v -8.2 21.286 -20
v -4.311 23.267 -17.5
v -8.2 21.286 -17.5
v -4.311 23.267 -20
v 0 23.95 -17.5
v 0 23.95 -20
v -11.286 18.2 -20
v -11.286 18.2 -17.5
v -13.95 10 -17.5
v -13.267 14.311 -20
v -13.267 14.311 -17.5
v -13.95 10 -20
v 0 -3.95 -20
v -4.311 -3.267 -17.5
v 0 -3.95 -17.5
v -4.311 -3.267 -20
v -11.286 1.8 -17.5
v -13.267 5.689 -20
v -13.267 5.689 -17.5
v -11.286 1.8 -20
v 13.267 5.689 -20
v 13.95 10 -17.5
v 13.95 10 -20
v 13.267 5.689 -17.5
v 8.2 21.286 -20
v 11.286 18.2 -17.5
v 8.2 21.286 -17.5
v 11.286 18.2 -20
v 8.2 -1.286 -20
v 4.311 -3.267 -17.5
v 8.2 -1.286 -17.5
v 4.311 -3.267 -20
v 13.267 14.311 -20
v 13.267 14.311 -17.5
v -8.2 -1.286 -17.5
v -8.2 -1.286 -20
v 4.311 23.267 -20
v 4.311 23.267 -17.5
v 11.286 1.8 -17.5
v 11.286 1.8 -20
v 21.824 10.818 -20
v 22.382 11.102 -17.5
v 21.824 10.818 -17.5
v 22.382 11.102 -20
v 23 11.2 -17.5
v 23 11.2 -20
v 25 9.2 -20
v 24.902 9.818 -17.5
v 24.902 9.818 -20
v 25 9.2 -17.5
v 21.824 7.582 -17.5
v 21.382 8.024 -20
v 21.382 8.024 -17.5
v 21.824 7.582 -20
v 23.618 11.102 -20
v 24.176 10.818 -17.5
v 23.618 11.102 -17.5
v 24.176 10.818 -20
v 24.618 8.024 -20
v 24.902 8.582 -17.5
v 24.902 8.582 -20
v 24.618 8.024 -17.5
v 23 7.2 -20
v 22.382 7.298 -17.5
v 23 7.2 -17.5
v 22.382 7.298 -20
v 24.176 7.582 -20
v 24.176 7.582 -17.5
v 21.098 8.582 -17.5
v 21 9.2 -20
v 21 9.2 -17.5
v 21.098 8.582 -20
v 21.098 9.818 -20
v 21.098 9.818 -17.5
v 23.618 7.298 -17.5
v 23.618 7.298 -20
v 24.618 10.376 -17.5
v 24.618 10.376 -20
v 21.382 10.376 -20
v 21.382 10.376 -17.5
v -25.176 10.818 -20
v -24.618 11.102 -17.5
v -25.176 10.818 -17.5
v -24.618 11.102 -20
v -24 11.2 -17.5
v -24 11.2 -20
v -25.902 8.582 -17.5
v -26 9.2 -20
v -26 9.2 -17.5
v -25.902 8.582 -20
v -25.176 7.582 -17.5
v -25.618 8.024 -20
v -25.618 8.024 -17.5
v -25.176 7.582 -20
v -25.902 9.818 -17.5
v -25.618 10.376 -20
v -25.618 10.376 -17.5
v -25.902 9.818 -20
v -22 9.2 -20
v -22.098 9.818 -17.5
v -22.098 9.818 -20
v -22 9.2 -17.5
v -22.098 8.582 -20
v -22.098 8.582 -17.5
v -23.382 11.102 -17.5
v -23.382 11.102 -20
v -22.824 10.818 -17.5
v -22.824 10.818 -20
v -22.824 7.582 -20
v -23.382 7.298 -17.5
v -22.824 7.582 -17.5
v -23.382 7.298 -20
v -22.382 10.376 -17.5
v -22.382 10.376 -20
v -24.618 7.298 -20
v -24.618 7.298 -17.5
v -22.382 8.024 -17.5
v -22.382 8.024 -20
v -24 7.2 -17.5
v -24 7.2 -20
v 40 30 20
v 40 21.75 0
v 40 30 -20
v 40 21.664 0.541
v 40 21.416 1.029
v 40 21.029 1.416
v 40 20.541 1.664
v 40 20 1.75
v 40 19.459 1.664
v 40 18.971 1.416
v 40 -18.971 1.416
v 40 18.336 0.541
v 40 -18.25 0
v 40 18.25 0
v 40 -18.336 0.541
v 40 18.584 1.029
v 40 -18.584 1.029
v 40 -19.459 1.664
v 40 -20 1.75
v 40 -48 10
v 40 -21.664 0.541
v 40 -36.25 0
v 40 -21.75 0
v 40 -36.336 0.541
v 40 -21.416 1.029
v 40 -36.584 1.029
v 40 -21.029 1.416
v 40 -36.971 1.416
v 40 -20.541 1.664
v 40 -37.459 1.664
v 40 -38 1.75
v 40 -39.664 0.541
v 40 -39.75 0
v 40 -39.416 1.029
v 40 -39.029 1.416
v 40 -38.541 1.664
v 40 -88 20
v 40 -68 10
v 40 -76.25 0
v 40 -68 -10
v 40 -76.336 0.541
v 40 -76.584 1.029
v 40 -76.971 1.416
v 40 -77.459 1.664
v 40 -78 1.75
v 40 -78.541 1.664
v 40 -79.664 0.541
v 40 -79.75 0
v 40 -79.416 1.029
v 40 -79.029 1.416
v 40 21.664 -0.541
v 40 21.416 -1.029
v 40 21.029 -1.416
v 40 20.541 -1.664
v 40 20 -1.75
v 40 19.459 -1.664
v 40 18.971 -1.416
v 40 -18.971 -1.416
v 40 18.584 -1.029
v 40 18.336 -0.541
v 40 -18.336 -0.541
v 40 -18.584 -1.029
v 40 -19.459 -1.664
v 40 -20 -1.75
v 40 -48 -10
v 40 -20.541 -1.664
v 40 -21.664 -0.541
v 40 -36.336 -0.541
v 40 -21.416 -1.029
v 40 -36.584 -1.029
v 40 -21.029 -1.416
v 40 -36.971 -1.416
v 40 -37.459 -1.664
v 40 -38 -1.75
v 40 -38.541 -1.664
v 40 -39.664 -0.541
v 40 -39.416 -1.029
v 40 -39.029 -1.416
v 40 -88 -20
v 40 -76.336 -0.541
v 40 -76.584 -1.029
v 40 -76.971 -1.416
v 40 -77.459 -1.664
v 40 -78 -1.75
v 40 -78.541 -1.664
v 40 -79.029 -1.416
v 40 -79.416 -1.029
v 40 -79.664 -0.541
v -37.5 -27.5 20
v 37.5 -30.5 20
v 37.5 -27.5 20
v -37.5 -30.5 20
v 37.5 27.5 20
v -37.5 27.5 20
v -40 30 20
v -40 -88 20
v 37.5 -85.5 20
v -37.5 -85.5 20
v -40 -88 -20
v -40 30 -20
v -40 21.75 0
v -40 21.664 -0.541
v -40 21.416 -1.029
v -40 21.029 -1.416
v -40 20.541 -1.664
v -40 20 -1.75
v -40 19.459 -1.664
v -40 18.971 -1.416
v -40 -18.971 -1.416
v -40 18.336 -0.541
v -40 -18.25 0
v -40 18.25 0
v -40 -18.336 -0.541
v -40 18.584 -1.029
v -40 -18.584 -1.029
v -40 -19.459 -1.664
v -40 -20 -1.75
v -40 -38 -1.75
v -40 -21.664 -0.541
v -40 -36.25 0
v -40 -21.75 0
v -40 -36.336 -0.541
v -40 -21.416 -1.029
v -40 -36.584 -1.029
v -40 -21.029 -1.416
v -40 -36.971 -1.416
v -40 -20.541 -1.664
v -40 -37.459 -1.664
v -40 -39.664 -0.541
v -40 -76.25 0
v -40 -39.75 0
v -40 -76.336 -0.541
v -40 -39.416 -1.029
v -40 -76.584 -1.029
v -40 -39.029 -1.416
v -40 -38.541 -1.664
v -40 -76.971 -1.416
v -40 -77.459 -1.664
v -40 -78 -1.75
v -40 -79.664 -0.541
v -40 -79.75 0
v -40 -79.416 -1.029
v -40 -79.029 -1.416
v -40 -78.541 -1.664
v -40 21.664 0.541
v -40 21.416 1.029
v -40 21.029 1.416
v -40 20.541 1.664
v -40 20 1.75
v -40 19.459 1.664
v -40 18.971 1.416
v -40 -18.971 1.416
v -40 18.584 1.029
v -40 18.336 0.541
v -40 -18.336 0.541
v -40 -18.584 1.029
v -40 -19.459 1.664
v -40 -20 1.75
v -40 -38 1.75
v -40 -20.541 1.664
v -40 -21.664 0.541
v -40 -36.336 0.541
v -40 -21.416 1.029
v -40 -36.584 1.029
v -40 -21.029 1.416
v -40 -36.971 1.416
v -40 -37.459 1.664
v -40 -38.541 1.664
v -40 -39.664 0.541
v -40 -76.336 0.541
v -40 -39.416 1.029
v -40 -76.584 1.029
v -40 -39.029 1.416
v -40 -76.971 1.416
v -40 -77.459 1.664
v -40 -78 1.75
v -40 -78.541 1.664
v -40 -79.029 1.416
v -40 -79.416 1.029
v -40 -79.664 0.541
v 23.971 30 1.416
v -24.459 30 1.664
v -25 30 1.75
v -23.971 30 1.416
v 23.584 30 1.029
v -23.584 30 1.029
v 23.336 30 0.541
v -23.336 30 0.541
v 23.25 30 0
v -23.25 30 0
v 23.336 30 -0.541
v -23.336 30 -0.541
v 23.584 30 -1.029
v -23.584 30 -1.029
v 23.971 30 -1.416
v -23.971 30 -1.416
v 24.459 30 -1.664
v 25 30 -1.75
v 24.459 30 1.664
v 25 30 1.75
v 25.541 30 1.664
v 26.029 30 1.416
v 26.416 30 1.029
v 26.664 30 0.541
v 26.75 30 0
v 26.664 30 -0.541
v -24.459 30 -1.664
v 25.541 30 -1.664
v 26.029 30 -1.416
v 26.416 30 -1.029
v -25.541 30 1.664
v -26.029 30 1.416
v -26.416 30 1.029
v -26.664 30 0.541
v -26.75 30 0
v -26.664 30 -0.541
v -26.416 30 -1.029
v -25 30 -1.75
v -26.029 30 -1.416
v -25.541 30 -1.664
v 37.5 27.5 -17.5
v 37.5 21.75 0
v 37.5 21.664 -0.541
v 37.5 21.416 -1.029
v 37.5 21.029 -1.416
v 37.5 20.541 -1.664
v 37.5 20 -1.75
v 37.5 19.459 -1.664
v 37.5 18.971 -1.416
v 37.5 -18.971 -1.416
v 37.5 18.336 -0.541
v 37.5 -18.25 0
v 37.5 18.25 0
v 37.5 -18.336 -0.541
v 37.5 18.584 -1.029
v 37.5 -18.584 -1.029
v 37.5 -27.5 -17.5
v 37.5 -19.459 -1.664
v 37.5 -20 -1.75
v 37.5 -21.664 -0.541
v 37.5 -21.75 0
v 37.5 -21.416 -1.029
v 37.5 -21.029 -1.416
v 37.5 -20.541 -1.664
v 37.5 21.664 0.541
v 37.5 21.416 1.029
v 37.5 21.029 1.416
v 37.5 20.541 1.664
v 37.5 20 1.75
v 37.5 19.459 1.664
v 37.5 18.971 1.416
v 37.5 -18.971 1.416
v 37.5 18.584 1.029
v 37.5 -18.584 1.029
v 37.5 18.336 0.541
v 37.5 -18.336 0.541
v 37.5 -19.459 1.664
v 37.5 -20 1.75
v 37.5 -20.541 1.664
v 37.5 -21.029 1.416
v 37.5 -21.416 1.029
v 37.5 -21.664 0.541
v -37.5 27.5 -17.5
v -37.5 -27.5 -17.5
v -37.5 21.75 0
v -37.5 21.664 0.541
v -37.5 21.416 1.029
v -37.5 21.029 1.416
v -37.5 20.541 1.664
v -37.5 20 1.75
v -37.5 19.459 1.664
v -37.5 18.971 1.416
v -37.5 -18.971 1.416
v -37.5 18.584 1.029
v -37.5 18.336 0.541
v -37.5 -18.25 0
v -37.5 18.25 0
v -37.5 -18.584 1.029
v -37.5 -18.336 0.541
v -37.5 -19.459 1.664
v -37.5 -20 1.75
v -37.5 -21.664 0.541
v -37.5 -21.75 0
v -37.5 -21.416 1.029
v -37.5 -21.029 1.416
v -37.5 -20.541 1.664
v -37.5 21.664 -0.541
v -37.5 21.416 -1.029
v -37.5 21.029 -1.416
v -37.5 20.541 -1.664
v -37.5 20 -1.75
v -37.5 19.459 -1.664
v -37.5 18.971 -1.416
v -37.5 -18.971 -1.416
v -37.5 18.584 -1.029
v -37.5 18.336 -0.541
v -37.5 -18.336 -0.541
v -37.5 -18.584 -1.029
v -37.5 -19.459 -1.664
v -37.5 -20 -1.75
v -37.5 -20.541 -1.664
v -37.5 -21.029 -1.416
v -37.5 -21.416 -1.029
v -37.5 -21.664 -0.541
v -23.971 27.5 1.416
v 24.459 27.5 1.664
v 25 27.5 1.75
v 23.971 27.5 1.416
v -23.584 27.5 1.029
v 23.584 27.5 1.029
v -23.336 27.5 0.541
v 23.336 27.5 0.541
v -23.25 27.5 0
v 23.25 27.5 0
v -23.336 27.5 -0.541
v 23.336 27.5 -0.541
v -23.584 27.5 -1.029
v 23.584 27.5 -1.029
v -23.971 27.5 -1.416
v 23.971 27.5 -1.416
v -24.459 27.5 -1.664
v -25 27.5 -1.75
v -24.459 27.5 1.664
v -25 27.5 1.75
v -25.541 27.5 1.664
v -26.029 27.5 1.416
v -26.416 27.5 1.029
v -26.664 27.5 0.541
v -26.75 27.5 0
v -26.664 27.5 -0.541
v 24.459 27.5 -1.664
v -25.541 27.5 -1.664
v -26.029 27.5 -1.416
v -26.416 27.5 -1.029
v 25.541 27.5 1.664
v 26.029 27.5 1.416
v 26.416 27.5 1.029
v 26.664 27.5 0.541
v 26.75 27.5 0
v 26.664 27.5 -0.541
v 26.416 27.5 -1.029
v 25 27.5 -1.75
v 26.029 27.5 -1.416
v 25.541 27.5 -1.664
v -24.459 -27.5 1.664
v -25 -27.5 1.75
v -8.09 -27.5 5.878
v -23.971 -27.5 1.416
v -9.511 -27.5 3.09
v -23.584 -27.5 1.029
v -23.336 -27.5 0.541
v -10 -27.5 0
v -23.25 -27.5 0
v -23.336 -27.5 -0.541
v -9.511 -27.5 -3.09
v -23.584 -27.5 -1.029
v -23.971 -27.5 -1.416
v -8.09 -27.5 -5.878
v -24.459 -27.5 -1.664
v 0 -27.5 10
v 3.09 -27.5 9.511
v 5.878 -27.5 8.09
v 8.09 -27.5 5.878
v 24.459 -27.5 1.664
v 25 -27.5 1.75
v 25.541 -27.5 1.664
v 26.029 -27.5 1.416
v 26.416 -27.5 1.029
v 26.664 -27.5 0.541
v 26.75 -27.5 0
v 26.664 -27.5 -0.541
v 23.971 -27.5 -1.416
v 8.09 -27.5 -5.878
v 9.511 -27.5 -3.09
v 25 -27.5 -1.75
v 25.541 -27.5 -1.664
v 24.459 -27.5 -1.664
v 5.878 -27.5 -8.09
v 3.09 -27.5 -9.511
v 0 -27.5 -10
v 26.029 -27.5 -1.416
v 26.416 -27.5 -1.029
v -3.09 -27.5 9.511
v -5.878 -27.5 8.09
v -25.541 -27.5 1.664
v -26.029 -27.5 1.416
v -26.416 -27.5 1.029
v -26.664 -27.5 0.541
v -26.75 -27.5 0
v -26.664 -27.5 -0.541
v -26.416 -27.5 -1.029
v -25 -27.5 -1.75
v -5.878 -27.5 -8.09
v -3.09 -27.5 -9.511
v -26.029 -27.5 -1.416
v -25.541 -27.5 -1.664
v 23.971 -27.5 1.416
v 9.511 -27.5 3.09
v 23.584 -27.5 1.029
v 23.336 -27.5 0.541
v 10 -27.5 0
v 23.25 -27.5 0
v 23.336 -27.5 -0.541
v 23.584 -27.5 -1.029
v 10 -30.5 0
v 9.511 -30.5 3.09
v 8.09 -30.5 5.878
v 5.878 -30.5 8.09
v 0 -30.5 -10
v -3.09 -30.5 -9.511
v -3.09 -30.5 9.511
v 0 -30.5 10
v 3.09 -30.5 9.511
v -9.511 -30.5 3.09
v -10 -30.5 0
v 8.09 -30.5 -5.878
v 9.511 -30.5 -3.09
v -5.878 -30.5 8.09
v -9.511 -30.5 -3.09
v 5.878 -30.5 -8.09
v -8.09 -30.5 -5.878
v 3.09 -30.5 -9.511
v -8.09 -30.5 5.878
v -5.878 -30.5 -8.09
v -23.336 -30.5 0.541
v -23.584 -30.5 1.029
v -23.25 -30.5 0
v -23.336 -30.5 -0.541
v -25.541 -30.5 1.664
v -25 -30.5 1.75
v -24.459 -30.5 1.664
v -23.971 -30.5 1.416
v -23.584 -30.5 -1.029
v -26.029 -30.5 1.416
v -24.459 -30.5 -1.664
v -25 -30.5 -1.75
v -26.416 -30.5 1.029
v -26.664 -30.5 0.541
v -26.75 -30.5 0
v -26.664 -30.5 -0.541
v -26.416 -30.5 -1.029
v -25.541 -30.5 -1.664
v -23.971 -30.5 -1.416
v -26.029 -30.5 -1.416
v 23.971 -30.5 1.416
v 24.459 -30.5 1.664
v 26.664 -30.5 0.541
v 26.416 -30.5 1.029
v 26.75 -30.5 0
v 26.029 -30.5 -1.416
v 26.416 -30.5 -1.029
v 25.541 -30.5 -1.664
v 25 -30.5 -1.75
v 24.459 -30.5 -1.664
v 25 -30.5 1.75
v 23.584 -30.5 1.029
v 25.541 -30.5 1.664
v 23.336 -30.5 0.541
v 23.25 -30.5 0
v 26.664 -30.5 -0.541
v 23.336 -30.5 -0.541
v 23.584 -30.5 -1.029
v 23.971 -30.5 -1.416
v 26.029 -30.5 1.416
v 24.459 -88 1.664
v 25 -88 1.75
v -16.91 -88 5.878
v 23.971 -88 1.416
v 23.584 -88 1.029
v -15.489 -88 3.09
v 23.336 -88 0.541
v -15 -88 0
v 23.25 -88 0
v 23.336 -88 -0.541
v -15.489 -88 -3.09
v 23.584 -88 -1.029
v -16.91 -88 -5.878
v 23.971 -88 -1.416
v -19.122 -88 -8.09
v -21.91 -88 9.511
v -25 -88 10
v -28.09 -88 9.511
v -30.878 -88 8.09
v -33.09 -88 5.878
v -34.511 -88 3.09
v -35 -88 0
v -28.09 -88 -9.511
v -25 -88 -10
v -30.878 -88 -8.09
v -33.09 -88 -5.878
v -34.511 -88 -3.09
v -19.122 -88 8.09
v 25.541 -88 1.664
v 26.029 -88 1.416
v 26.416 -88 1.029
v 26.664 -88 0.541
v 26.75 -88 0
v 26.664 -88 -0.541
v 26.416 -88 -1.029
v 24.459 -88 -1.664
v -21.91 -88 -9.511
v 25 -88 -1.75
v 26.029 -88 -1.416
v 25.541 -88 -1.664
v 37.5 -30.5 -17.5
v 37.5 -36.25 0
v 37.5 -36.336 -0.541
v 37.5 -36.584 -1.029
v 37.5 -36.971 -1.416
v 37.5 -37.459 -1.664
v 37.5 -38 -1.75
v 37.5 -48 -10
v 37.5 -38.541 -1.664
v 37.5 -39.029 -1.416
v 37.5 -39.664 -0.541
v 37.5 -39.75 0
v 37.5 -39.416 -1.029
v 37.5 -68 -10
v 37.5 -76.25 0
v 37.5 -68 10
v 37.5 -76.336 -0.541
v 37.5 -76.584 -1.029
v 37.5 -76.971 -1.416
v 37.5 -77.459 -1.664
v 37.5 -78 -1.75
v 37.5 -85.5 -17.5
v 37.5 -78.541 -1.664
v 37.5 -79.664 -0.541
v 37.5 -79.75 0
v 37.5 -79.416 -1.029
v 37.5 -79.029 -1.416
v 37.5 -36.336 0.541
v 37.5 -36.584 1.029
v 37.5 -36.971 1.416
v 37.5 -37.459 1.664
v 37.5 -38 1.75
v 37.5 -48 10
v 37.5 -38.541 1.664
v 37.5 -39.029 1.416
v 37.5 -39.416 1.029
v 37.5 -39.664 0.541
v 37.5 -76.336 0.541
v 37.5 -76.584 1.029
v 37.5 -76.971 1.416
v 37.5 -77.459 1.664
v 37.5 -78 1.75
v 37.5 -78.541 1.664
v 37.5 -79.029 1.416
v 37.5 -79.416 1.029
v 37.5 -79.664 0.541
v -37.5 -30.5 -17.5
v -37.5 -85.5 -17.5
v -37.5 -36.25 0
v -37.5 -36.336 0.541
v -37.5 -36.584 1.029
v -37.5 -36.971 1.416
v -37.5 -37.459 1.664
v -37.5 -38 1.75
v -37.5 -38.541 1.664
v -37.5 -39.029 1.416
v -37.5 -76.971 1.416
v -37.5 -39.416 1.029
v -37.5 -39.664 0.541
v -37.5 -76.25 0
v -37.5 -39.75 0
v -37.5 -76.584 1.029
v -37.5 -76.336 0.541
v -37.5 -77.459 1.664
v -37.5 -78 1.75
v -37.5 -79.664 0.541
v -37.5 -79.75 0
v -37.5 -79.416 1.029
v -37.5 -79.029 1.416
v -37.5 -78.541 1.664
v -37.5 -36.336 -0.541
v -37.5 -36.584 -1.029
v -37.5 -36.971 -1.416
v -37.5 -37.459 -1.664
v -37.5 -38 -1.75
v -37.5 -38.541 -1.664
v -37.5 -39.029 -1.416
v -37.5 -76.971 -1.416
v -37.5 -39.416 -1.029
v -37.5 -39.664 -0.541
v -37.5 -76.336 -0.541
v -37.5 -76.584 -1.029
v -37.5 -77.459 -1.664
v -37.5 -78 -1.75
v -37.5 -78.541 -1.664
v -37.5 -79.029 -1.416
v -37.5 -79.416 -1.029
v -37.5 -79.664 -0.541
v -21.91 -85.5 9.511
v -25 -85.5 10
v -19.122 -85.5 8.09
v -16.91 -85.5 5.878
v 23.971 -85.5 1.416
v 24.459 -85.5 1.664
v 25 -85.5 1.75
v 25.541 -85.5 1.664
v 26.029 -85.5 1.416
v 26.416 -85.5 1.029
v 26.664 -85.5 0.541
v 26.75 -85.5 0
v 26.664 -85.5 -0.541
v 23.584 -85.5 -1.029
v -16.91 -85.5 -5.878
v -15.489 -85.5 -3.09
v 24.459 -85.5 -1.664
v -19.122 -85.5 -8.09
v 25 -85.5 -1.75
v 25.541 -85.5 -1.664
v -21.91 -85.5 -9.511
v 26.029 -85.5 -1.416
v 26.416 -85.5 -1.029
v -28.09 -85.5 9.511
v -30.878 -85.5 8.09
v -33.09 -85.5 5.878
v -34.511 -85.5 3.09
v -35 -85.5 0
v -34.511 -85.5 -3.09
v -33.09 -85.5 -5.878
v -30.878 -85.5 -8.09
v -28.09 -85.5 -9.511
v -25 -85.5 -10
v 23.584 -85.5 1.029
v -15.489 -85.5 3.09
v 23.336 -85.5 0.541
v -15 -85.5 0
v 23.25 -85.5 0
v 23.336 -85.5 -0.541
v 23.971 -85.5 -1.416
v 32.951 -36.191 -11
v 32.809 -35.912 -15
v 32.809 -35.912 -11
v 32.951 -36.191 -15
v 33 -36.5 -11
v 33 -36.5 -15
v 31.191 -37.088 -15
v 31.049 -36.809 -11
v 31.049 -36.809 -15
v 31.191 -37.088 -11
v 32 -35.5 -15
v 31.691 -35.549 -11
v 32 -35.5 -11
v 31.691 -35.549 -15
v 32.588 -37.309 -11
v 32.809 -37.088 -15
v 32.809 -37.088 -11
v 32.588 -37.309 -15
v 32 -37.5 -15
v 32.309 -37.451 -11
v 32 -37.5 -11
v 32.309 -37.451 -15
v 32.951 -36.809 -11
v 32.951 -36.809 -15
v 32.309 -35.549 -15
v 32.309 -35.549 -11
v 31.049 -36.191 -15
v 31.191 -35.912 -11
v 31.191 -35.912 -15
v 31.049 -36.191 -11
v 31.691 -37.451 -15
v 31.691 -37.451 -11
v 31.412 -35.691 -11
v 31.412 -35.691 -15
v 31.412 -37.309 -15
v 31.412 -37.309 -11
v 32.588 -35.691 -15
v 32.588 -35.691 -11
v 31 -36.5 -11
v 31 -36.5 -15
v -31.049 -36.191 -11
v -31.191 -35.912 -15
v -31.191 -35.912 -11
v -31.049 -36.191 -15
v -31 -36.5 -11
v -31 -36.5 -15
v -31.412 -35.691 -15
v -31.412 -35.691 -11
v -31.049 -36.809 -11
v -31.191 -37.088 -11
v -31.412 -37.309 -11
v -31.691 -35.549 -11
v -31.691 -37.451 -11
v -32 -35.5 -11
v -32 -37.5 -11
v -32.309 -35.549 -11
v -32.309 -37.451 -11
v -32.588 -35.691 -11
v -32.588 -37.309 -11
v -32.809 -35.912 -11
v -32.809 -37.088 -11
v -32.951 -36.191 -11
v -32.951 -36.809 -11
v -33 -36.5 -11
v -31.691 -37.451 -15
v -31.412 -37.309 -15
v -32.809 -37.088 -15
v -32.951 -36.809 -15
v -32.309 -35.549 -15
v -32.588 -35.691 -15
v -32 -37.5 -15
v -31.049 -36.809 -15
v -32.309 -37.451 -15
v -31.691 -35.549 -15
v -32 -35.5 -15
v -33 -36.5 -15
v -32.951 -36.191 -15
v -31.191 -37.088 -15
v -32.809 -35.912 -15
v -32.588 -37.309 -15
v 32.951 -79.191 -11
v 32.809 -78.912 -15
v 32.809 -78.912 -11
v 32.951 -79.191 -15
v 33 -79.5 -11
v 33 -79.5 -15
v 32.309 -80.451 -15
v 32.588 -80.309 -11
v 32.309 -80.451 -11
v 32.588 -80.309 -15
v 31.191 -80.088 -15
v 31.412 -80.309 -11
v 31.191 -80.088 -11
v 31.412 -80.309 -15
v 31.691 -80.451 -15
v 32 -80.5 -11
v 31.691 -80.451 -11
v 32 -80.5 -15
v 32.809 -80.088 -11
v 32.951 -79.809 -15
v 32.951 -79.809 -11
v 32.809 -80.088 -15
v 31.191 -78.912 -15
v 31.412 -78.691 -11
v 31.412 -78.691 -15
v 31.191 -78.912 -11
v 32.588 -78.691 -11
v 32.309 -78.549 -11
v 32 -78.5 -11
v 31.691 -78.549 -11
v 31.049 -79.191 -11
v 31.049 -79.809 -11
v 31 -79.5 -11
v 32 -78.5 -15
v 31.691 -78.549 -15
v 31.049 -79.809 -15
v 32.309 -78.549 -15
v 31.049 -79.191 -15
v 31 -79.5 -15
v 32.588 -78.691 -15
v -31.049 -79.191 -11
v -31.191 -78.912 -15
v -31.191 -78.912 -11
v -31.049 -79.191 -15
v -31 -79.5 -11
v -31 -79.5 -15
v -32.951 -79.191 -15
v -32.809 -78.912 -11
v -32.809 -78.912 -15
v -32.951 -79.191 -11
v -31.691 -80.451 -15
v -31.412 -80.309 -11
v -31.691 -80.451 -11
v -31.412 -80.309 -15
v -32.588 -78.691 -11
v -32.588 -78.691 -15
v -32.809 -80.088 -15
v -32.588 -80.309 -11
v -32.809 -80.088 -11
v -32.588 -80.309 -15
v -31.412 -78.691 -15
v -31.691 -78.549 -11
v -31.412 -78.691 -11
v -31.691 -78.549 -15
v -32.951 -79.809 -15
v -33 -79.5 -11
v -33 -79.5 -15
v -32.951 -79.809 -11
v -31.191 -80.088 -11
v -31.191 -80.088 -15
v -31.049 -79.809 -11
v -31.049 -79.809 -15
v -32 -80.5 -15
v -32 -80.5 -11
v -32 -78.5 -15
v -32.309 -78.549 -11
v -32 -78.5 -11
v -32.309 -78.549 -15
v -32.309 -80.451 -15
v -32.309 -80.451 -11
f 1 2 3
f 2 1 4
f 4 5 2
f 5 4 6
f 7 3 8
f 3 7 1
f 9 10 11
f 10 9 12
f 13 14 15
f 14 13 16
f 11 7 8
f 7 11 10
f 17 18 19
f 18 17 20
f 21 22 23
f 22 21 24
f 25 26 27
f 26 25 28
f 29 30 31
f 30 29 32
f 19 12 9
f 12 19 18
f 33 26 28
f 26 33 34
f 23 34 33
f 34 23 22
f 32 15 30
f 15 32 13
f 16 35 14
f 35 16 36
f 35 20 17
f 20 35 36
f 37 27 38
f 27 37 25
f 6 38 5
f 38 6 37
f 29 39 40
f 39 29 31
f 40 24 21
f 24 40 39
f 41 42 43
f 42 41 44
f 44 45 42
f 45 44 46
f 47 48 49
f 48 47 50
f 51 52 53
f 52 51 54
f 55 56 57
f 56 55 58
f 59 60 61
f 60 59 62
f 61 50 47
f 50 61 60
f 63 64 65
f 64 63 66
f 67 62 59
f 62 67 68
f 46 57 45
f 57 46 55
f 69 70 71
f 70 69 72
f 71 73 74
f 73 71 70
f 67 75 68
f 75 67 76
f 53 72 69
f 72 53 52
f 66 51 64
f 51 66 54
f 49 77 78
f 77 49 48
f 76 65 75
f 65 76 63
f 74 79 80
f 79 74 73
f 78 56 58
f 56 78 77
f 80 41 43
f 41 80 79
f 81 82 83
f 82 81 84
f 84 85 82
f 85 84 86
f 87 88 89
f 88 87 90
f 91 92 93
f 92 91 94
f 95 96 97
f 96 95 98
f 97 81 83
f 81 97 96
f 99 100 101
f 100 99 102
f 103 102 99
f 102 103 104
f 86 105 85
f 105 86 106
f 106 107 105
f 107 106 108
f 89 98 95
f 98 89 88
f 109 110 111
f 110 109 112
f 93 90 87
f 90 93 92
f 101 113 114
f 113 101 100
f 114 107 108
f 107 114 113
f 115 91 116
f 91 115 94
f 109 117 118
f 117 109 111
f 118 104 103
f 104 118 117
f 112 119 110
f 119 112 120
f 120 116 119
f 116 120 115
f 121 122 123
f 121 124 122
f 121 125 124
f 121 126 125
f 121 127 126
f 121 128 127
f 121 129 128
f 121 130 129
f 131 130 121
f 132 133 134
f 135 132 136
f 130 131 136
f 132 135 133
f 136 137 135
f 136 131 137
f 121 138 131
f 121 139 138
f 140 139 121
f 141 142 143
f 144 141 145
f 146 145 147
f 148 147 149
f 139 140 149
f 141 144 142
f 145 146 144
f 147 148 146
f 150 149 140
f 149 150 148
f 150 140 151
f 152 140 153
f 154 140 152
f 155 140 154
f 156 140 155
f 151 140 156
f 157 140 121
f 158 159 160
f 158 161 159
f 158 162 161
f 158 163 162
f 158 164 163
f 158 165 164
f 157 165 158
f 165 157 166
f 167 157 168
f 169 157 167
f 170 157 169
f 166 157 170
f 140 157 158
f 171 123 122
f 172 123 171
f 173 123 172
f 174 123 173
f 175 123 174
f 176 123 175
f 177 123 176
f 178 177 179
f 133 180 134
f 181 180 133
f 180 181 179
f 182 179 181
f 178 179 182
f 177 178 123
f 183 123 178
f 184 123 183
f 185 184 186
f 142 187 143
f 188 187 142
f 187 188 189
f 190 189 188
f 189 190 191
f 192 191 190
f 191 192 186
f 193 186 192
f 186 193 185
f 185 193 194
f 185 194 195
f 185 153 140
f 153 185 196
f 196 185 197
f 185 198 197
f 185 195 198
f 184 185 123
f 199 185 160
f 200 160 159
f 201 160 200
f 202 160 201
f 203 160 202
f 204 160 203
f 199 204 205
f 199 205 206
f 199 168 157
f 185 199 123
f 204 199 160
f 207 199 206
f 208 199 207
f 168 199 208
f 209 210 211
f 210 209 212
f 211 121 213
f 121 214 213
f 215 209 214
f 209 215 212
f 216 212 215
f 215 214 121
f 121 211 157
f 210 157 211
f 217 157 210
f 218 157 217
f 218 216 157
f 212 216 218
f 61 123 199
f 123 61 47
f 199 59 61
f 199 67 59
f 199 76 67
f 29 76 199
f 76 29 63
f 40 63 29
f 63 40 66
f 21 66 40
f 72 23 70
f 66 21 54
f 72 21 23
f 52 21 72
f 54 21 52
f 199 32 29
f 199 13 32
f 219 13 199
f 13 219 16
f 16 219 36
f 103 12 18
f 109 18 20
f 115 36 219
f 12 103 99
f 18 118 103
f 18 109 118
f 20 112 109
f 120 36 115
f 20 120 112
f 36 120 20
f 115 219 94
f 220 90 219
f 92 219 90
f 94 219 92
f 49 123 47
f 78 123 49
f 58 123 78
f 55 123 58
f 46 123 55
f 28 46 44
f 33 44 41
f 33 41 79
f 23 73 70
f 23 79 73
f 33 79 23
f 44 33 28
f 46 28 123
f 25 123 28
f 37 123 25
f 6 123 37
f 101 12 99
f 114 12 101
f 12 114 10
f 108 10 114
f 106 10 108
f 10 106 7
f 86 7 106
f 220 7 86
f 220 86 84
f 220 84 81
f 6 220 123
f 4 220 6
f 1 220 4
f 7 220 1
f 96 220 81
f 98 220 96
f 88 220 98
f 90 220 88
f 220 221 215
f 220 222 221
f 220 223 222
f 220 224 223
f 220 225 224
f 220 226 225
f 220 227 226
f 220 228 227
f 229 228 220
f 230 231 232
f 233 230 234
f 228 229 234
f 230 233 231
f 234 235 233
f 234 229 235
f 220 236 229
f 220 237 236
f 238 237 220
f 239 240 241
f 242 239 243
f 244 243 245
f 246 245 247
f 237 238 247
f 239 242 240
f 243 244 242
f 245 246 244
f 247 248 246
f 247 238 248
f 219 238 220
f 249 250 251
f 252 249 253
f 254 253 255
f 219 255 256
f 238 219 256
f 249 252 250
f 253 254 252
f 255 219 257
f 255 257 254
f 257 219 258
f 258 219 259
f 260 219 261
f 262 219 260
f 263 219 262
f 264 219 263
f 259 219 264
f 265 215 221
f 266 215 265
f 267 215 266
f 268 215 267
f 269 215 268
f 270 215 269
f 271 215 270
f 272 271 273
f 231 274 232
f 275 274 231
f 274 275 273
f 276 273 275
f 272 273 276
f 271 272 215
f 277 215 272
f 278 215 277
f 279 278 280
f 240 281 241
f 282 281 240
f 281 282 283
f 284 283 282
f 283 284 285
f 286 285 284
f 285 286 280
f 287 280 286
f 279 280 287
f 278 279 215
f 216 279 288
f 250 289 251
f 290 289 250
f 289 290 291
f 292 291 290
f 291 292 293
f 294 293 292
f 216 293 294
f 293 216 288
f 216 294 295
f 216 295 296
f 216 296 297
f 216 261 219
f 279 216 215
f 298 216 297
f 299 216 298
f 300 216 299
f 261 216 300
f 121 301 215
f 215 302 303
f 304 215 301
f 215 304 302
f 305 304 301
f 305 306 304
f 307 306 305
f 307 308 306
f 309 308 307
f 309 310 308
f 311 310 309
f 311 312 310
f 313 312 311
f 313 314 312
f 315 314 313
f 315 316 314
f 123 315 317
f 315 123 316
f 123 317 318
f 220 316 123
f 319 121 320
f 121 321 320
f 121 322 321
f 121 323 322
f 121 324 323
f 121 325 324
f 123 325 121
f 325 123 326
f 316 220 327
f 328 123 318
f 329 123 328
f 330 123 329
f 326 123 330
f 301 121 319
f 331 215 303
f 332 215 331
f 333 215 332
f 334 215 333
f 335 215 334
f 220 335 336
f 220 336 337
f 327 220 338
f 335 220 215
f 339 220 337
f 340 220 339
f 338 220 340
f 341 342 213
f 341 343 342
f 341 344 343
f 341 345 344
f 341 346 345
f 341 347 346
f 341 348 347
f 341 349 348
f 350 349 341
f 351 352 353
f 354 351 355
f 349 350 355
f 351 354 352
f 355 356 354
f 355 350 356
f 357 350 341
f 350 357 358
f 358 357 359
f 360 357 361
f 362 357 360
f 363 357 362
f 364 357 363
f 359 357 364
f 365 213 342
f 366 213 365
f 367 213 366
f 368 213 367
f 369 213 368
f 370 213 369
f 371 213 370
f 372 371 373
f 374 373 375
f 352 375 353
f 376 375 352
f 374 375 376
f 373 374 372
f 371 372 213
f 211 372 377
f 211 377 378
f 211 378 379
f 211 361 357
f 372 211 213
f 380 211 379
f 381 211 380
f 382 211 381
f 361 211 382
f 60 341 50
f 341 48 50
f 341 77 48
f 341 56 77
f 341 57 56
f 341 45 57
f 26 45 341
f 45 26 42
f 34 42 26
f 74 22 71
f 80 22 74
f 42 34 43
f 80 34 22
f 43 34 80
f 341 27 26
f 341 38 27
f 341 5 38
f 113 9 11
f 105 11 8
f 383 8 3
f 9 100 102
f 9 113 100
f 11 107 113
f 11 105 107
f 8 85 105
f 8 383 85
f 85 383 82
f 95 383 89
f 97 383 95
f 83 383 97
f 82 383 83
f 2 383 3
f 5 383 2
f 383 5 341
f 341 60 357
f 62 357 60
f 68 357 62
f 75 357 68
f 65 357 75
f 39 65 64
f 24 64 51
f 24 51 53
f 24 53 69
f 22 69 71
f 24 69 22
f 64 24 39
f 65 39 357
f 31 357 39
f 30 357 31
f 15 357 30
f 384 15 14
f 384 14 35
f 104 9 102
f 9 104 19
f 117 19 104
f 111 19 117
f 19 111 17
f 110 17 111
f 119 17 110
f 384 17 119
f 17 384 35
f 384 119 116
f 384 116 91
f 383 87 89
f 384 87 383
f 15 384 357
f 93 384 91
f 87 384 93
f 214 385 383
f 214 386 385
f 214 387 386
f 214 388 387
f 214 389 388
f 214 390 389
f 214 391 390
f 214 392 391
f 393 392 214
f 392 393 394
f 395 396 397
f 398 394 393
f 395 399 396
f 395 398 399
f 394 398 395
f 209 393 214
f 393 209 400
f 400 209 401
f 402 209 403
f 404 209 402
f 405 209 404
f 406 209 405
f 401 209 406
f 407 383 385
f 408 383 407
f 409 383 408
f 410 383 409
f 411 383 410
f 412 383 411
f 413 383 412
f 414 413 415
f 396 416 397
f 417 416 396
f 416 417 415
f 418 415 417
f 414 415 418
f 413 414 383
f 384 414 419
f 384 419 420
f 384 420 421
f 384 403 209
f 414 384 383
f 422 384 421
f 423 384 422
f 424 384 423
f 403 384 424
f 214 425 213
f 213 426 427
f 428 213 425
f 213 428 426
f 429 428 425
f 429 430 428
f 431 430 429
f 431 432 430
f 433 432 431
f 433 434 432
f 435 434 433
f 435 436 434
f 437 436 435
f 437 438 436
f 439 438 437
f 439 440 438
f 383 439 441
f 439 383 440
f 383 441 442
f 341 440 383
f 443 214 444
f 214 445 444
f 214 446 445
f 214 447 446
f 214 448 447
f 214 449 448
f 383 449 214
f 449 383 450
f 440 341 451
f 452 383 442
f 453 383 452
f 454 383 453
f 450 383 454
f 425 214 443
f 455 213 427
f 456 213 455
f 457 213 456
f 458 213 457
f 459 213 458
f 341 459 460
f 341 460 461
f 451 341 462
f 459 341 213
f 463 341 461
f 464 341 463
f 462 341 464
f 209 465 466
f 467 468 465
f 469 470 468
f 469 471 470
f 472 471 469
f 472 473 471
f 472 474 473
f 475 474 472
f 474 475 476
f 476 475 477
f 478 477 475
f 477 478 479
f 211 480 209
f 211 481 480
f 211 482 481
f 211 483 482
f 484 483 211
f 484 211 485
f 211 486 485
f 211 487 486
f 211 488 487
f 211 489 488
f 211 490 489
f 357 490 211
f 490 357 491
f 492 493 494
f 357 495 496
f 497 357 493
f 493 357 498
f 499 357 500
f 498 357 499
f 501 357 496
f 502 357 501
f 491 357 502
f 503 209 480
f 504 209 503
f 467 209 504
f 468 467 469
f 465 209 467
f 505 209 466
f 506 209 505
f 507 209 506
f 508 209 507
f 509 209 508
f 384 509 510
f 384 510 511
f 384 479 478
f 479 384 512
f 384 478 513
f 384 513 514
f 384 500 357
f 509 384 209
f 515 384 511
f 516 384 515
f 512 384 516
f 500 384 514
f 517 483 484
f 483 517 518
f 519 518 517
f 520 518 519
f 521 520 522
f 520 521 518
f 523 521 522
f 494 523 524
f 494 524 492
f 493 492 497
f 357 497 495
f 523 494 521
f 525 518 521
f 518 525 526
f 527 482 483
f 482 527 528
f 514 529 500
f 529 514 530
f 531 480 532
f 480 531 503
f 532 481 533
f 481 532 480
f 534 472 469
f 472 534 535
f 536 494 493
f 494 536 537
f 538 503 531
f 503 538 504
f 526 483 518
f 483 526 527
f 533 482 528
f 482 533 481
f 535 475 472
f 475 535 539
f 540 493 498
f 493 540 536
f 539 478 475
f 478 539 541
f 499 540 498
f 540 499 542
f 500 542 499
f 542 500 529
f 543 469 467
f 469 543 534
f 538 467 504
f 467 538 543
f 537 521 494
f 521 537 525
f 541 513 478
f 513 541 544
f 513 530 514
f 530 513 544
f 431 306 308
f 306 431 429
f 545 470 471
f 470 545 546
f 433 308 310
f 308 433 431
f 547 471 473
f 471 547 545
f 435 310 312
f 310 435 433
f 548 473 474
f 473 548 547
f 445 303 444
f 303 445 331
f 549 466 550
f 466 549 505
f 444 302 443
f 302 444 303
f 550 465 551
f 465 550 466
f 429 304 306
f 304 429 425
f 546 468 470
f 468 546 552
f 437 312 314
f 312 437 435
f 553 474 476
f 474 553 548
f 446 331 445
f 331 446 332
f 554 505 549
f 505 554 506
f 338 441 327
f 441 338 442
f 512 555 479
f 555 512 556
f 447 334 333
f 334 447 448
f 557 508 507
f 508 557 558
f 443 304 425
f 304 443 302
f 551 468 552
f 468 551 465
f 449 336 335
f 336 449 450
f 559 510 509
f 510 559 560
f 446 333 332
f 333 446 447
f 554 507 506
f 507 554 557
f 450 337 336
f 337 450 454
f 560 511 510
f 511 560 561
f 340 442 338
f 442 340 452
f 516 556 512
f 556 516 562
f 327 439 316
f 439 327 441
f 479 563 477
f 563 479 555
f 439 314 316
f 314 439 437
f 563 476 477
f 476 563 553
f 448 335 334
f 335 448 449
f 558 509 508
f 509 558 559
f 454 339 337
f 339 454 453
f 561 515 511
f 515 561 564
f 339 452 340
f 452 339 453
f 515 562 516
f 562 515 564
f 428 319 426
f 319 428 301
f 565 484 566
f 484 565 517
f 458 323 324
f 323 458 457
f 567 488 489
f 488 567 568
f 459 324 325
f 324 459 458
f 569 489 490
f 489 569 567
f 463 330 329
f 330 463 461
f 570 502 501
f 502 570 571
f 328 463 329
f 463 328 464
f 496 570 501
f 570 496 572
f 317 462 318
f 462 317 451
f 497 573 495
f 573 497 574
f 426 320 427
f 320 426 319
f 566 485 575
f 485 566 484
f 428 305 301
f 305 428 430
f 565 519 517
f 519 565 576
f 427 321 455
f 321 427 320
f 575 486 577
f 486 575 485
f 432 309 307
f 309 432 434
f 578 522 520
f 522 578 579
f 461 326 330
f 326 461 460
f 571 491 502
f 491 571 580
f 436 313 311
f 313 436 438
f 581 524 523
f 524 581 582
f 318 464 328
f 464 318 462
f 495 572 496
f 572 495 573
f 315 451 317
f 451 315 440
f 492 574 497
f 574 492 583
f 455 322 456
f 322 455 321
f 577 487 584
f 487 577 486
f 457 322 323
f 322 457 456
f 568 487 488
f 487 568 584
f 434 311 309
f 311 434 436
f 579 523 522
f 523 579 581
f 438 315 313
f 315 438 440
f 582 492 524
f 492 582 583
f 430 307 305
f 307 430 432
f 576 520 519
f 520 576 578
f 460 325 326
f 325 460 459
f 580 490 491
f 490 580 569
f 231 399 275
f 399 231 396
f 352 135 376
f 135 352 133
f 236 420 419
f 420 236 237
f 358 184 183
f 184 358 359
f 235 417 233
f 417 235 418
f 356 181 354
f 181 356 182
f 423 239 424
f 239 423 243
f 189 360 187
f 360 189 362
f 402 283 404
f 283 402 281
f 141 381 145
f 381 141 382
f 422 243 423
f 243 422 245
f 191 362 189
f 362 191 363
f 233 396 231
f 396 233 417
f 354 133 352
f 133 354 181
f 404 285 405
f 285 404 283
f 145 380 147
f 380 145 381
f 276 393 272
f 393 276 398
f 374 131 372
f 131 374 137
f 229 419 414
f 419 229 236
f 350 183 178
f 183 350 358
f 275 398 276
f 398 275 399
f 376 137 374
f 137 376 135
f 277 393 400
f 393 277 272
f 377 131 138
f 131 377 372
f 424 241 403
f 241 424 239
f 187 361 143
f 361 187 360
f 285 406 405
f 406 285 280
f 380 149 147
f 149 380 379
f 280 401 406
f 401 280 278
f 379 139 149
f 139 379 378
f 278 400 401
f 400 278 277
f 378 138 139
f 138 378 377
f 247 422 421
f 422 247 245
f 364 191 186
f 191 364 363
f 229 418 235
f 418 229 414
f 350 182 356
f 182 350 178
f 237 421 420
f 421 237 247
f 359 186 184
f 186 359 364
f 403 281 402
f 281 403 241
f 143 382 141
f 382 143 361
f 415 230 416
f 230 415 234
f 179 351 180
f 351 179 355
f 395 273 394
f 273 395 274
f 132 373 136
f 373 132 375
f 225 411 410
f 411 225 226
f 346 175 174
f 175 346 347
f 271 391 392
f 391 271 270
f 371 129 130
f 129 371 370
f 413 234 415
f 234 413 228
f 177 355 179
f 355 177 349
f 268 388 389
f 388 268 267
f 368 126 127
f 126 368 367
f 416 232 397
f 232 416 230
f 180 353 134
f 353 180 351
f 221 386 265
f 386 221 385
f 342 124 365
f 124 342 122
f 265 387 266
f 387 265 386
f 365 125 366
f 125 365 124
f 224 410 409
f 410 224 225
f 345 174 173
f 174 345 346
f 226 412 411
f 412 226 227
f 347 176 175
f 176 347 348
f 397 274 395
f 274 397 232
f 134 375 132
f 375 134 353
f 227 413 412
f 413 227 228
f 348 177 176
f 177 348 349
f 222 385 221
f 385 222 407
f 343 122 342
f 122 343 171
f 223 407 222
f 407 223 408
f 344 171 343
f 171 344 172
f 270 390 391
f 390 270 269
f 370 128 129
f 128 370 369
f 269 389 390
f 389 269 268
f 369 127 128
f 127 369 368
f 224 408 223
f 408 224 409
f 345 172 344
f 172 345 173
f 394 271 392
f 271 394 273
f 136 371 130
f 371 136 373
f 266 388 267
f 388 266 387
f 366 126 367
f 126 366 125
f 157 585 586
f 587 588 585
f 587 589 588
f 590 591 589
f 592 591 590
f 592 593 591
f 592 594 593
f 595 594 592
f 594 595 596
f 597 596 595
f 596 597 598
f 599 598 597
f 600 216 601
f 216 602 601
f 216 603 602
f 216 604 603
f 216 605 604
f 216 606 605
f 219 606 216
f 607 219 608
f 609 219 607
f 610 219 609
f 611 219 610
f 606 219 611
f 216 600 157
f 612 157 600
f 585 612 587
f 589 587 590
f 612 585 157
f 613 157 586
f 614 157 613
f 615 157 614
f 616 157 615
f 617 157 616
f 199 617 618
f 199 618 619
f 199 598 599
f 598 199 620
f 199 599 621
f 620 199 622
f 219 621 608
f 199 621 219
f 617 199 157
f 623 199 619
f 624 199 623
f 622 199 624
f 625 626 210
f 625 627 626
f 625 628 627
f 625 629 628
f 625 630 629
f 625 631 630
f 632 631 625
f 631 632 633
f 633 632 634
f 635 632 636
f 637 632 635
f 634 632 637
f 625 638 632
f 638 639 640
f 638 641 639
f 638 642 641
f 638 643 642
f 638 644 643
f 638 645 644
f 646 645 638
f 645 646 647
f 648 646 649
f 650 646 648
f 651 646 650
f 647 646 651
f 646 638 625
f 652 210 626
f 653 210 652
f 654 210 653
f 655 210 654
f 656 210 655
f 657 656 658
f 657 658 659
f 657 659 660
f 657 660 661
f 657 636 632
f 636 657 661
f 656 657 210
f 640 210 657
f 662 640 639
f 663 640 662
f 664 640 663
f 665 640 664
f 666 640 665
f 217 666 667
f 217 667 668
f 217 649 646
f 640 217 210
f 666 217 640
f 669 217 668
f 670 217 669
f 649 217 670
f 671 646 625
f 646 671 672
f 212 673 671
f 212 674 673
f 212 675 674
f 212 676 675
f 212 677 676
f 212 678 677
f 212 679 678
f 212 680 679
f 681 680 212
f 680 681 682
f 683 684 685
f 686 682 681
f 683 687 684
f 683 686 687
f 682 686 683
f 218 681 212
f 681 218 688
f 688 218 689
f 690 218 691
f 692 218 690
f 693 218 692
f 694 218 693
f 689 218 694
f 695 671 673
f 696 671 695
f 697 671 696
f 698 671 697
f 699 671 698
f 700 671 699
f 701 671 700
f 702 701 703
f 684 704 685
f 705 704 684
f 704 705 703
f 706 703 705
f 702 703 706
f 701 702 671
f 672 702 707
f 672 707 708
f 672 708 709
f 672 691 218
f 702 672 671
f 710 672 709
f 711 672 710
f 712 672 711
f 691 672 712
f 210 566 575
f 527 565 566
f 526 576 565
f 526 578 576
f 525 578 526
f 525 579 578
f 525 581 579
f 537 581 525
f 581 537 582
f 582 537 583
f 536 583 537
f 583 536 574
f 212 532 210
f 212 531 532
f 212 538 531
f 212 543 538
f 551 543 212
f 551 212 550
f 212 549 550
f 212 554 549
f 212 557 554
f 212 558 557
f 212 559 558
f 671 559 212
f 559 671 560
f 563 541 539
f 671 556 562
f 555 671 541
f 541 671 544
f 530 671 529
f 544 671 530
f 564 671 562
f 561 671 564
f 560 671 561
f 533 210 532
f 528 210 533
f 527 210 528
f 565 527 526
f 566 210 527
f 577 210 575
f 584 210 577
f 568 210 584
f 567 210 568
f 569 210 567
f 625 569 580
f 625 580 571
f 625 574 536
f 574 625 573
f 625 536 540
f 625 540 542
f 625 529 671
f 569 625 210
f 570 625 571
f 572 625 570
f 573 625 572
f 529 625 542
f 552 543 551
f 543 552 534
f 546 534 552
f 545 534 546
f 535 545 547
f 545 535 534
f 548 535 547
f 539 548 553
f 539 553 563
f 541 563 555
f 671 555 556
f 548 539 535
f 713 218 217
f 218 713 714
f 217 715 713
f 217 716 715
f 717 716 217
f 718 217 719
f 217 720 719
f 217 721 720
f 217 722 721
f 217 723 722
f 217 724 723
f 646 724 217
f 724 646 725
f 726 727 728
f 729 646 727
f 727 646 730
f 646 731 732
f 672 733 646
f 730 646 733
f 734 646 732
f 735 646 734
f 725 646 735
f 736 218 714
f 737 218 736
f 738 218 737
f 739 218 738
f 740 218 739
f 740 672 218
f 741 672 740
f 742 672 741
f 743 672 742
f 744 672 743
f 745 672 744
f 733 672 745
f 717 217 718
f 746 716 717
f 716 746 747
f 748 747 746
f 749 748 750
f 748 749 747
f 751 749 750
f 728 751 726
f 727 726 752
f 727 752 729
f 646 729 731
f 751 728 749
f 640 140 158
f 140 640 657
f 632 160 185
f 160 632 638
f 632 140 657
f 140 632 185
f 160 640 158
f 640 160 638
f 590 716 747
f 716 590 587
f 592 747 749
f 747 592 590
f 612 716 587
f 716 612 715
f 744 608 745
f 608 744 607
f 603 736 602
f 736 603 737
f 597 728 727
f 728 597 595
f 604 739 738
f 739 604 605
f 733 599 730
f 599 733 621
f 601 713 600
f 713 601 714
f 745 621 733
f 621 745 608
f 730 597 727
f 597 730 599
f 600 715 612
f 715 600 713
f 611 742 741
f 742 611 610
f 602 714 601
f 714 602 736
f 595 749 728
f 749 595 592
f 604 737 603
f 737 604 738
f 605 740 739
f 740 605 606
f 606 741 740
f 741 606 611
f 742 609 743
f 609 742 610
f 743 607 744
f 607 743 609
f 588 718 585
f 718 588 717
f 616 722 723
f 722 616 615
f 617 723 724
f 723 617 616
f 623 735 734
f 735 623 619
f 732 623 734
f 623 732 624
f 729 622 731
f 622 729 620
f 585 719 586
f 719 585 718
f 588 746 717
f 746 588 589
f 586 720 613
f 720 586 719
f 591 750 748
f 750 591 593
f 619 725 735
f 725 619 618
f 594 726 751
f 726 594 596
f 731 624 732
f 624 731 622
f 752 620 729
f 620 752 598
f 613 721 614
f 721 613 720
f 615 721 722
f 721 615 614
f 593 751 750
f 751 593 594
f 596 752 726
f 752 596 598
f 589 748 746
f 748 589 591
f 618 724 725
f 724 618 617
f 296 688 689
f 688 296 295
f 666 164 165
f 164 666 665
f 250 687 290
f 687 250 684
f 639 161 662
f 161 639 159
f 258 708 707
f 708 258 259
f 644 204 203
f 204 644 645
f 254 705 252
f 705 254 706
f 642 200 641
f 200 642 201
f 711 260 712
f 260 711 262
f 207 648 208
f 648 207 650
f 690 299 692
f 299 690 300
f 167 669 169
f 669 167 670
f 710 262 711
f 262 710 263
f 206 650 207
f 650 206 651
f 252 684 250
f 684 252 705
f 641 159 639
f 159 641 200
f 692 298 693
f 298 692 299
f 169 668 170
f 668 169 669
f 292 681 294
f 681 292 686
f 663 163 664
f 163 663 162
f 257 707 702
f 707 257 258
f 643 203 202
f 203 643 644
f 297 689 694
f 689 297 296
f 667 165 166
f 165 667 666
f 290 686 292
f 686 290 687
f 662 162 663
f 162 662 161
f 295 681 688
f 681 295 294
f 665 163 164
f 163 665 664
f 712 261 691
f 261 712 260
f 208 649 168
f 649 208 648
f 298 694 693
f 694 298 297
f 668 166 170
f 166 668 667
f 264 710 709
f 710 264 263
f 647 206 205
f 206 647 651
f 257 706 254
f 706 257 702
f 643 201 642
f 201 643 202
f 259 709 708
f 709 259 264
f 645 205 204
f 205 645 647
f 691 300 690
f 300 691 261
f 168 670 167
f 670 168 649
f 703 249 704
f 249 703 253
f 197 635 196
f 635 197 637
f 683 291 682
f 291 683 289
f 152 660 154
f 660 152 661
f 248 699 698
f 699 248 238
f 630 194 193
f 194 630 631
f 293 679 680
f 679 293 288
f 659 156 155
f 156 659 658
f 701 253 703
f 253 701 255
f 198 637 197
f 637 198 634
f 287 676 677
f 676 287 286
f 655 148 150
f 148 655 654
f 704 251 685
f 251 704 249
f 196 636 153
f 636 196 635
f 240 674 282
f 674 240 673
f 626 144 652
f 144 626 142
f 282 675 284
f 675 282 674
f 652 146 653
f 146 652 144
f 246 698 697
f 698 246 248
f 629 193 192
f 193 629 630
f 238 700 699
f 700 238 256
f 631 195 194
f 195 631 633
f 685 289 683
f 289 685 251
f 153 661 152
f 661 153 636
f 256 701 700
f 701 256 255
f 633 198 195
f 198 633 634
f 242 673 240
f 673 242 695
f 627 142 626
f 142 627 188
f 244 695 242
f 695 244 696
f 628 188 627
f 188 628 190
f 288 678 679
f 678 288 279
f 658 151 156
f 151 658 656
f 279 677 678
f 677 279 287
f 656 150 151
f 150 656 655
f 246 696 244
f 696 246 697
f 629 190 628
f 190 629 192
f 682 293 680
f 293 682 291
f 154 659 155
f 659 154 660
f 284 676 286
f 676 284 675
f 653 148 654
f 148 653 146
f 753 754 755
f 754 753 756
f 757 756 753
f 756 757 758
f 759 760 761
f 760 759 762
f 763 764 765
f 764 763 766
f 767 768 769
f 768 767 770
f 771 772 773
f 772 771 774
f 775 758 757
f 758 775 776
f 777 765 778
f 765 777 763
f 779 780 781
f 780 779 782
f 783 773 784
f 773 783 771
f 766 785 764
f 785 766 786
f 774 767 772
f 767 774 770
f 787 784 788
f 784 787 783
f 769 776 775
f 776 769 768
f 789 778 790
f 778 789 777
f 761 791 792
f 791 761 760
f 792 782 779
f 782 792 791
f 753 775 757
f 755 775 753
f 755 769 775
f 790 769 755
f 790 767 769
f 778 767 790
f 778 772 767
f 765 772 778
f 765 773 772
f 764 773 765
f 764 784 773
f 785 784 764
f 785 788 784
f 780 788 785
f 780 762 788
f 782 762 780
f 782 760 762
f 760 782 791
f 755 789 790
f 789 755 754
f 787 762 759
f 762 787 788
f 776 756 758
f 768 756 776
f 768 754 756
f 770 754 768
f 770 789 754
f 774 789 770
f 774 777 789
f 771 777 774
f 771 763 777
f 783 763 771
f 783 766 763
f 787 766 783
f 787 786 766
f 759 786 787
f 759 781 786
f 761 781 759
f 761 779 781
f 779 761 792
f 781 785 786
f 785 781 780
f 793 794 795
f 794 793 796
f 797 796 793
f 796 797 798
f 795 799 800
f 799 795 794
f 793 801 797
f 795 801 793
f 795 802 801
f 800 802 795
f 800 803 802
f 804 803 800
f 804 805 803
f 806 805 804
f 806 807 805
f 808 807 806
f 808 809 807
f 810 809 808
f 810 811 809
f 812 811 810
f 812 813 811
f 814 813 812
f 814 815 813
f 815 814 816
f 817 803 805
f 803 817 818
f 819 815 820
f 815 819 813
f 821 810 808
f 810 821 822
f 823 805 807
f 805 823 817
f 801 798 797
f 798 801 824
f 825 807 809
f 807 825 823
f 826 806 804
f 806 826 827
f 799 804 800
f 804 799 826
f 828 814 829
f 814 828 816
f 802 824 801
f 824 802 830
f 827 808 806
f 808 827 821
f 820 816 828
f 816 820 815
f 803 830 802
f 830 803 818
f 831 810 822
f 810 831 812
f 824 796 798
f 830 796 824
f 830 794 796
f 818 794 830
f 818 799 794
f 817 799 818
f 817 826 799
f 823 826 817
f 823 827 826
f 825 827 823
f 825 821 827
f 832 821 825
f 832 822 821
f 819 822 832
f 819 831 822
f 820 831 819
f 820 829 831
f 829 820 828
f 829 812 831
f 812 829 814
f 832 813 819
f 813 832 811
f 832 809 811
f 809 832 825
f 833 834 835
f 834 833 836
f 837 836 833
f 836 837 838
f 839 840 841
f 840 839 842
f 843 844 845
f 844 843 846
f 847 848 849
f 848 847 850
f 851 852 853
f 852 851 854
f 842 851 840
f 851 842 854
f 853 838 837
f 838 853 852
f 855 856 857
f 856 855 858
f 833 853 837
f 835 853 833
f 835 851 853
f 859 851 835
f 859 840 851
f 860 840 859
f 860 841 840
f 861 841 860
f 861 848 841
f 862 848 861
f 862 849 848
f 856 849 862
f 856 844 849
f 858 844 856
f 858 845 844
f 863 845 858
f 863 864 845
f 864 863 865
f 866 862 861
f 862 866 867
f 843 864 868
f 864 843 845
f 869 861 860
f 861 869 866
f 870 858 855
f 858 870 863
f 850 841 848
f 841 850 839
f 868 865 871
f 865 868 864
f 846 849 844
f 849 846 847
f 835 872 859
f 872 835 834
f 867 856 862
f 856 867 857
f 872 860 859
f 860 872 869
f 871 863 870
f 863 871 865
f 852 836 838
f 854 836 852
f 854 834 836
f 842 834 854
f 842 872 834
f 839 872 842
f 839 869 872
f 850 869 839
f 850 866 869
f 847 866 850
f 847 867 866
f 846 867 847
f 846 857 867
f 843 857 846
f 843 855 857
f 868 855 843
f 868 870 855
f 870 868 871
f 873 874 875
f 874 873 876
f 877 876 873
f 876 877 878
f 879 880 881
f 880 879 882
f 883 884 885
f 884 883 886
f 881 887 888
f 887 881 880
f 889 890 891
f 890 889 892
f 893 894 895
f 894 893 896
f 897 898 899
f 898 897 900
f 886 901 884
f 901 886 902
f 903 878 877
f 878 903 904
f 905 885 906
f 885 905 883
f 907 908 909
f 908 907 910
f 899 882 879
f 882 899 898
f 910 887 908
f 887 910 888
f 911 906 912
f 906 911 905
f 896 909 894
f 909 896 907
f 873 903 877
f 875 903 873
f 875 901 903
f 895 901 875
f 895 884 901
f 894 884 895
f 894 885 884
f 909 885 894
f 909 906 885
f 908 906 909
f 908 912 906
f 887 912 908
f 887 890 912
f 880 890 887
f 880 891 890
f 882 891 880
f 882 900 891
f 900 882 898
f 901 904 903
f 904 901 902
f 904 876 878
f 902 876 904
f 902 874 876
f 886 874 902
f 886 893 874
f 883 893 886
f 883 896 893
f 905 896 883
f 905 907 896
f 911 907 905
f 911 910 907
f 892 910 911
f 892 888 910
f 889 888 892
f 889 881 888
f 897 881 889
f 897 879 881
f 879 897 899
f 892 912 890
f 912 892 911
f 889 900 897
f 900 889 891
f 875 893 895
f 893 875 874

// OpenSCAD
ancho_pared=5;

cuerpo_joystick();
translate([0,-58,0]) rotate([0,0,0])
Cuerpo_arduino();
module Cuerpo_arduino(){
	difference(){
		
		//CUERPO CENTRAL
		union(){
			cube([80,60,40],center=true);
			
			
			//pestañas de montaje
			
			
			/*
			translate([2.5,-60/2,5]) rotate([0,0,0])
			cube([65,10,4],center=true);
			
			
			
			//suplemento
			translate([60/2,0,0]) rotate([0,0,0])
			cube([10,50,14],center=true);
			translate([10,0,3]) rotate([0,0,0])
		//cube([50,42,16],center=true);
		cylinder(r=15.5/2,h=14, $fn=6, center=true)
			*/
			
		}
		
		//VACIADO CENTRAL
		translate([0,0,2.5]) rotate([0,0,0])
		cube([75,55,40],center=true);
		
		//TAPA USB
		translate([40,0,0]) rotate([0,0,0])
		cube([20,20,20],center=true);

		//AGUJERO ANTENA
		translate([-25,-30,0]) rotate([90,0,0])
		//cube([20,20,20],center=true);
		cylinder(r=20/2,h=14, $fn=20, center=true);
		
		//AGUJERO PASACABLES
		translate([0,21,0]) rotate([90,0,0])
		cylinder(r=20/2,h=20, $fn=20, center=true);
		//AGUJEROS DE MONTAJE
		translate([-25,0,0]) rotate([90,0,0])
		cylinder(r=3.5/2,h=100, $fn=20, center=true);
		translate([25,0,0]) rotate([90,0,0])
		cylinder(r=3.5/2,h=100, $fn=20, center=true);
		translate([0,-20,0]) rotate([0,90,0])
		cylinder(r=3.5/2,h=100, $fn=20, center=true);
		translate([0,20,0]) rotate([0,90,0])
		cylinder(r=3.5/2,h=100, $fn=20, center=true);
		
		//
		}

		translate([64/2,43/2,-13]) rotate([0,0,0])
			cylinder(r=2/2,h=4, $fn=20, center=true);
		translate([-64/2,43/2,-13]) rotate([0,0,0])
			cylinder(r=2/2,h=4, $fn=20, center=true);
		translate([64/2,-43/2,-13]) rotate([0,0,0])
			cylinder(r=2/2,h=4, $fn=20, center=true);
		translate([-64/2,-43/2,-13]) rotate([0,0,0])
			cylinder(r=2/2,h=4, $fn=20, center=true);
		
}


//cuerpo_joystick();
module cuerpo_joystick(){
		difference(){
				union(){
			//CUERPO CENTRAL
				cube([80,60,40],center=true);





			}
		//vaciado central
		translate([0,0,2.5]) rotate([0,0,0])
		cube([75,55,40],center=true);
		//
		translate([0,10,-15]) rotate([0,0,90])
		agujeros_joystick();


		//AGUJERO PASACABLES
		translate([0,-21,0]) rotate([90,0,0])
		cylinder(r=20/2,h=20, $fn=20, center=true);
		//AGUJEROS DE MONTAJE
		translate([-25,0,0]) rotate([90,0,0])
		cylinder(r=3.5/2,h=100, $fn=20, center=true);
		translate([25,0,0]) rotate([90,0,0])
		cylinder(r=3.5/2,h=100, $fn=20, center=true);
		translate([0,-20,0]) rotate([0,90,0])
		cylinder(r=3.5/2,h=100, $fn=20, center=true);
		translate([0,20,0]) rotate([0,90,0])
		cylinder(r=3.5/2,h=100, $fn=20, center=true);
		}
}



module agujeros_joystick(){
		translate([0,0,0]) rotate([0,0,0])
			cylinder(r=27.9/2,h=20, $fn=20, center=true);

		translate([-0.8,-23,0]) rotate([0,0,0])
			cylinder(r=4/2,h=20, $fn=20, center=true);

		translate([-0.8,24,0]) rotate([0,0,0])
			cylinder(r=4/2,h=20, $fn=20, center=true);

		
}

//import_stl("JoyStick_Top_Plate.stl", convexity = 5);
